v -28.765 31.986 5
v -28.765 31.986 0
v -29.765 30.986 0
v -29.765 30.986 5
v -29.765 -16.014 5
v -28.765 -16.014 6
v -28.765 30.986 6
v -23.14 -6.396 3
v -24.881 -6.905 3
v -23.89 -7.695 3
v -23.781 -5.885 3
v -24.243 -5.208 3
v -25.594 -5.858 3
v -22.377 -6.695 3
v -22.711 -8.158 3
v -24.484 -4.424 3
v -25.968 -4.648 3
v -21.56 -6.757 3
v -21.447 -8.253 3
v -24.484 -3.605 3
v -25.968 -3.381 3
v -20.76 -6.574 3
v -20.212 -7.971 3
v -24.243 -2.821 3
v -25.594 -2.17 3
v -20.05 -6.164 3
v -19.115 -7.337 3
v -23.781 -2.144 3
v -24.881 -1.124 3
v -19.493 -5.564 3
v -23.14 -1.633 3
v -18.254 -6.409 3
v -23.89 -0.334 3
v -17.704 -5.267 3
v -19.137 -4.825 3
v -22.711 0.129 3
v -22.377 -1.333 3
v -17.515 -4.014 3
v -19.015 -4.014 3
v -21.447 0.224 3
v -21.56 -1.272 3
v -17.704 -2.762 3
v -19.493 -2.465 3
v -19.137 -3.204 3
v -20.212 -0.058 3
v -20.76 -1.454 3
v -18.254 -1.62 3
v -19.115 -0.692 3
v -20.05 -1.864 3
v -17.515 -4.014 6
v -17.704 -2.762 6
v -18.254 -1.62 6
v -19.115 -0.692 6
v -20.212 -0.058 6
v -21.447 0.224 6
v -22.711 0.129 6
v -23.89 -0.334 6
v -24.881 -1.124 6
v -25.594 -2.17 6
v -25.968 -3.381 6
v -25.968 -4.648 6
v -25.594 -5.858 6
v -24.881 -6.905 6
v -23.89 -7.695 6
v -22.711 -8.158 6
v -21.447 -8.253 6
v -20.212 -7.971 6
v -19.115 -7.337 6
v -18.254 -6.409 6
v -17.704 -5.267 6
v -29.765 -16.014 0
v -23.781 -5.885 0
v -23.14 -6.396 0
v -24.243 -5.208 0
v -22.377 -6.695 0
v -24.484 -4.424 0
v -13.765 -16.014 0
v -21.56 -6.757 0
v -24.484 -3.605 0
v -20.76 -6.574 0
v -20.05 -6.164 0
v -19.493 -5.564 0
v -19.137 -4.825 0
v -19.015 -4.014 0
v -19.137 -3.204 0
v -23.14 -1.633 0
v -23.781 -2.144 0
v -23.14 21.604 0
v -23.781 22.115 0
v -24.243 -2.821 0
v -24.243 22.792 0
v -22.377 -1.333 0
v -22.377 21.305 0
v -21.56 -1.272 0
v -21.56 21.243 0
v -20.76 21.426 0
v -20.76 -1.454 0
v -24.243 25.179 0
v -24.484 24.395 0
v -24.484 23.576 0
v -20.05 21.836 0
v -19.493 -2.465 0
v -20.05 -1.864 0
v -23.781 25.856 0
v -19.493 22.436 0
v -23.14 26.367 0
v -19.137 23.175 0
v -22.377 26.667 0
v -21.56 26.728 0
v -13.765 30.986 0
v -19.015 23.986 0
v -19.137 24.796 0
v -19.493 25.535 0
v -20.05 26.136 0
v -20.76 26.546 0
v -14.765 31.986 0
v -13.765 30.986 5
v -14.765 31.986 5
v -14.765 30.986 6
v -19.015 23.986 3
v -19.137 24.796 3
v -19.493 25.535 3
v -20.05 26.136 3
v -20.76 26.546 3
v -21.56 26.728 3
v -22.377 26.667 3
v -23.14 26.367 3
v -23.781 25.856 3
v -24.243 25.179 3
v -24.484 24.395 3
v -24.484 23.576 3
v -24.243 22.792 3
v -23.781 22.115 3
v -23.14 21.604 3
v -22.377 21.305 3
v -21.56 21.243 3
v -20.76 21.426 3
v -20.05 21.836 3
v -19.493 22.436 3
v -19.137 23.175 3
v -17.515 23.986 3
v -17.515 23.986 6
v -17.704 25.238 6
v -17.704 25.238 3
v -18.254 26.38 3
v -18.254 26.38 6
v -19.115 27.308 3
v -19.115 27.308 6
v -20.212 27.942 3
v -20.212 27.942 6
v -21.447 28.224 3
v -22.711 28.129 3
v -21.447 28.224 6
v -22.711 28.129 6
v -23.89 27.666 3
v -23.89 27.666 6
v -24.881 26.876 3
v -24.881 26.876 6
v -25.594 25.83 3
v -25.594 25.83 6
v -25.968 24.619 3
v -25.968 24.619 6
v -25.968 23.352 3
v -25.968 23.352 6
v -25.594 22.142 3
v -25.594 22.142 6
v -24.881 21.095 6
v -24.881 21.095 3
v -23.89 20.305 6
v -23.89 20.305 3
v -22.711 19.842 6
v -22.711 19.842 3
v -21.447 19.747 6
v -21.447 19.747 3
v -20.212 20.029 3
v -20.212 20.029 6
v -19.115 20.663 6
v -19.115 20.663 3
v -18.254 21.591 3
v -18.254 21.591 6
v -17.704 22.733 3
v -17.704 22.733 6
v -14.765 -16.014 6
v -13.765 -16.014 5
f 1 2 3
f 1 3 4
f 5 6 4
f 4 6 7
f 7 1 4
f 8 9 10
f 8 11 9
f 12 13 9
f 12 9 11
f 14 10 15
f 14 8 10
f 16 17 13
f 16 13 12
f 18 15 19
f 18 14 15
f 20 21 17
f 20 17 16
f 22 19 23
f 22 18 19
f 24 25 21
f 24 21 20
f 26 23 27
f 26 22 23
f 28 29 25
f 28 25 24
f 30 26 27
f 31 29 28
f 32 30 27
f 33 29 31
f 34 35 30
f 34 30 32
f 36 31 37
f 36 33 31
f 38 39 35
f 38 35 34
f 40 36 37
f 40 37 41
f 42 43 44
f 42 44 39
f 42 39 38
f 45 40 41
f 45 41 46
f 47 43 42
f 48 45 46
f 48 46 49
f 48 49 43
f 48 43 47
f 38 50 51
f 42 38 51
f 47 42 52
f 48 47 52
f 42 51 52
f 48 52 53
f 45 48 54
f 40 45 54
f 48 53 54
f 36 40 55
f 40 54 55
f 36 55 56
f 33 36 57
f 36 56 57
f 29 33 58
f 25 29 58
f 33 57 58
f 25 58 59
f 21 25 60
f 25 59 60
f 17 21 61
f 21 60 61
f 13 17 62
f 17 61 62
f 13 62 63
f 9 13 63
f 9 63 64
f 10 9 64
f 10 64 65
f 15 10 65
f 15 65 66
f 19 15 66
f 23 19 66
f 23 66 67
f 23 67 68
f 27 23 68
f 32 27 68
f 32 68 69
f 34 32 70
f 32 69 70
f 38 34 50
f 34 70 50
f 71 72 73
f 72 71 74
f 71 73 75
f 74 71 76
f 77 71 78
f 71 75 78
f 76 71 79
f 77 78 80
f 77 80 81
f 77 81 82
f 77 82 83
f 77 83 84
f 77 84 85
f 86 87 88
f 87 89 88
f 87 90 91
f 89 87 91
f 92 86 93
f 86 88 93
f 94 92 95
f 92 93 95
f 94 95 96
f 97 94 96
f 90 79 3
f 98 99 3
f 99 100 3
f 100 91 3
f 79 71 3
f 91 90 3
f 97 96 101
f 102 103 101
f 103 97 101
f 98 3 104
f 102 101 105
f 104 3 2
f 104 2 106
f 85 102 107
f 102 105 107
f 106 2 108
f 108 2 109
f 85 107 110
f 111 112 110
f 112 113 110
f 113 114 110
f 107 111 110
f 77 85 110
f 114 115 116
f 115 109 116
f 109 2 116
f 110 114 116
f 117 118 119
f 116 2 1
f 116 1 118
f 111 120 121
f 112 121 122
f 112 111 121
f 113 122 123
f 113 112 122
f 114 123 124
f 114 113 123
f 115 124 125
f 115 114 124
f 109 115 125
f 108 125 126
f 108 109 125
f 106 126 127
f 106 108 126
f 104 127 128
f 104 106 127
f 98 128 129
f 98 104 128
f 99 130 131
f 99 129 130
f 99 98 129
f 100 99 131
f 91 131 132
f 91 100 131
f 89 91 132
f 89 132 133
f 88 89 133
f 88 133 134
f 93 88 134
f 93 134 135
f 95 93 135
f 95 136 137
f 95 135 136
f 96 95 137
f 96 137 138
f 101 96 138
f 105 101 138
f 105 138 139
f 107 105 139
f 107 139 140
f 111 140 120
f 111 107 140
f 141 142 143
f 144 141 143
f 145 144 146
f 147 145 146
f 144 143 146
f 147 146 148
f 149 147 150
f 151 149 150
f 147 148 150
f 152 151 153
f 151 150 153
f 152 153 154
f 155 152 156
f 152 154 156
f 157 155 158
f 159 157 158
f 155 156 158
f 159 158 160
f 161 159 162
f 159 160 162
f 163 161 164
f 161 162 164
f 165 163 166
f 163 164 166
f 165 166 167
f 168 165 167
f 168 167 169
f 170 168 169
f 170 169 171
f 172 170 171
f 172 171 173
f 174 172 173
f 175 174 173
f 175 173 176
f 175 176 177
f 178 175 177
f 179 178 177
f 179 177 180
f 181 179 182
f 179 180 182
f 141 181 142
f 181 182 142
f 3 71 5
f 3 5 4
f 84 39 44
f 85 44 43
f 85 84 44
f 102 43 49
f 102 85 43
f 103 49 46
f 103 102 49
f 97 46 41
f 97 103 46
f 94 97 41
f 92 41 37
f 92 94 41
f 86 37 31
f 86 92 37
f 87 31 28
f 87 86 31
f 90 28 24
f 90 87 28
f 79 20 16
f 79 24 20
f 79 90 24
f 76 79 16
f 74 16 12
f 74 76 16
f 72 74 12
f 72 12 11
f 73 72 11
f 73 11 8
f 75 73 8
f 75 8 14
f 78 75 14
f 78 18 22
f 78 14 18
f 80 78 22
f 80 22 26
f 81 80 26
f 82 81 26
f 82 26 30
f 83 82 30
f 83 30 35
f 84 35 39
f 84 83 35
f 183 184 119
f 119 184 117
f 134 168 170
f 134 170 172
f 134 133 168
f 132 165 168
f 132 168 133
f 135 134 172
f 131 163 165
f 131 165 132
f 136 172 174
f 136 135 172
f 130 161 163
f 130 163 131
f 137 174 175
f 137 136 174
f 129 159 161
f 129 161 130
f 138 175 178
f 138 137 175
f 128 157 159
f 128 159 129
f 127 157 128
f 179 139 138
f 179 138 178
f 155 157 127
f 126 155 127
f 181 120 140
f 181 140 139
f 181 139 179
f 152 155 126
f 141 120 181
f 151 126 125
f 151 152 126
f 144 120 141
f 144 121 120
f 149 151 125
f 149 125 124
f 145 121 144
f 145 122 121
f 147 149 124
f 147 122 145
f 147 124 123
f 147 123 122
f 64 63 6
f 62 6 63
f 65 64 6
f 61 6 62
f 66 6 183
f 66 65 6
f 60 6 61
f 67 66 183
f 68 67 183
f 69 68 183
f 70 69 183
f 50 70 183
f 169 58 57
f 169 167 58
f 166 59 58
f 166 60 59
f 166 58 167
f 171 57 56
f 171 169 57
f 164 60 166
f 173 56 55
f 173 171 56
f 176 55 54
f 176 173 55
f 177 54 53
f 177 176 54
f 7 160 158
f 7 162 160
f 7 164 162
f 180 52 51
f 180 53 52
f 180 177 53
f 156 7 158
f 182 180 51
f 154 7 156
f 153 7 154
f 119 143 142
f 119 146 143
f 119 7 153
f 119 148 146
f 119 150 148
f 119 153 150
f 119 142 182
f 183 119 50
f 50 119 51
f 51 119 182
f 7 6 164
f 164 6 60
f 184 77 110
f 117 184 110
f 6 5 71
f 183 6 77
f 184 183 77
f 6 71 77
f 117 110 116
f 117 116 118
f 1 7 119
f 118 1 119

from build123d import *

# Parameters (mm, degrees)
F0_W     = 16
F0_H     = 48
F0_R     = 2.75
F1_DEPTH = 6
F2_R     = 4.25
F3_DEPTH = 3
F4_SIZE  = 1


with BuildPart() as f1:
    # F0 (on Top) → F1 (new body)
    with BuildSketch(Plane.XY):
        with Locations((-21.765074, 7.98561)):
            Rectangle(F0_W, F0_H)
        with Locations((-21.765074, -4.01439)):
            Circle(F0_R, mode=Mode.SUBTRACT)
        with Locations((-21.765074, 23.98561)):
            Circle(F0_R, mode=Mode.SUBTRACT)
    extrude(amount=F1_DEPTH)

    # F2 (on face) → F3 (cut)
    with BuildSketch(Plane.XY.offset(6)):
        with Locations((-21.765074, 23.98561)):
            Circle(F2_R)
        with Locations((-21.765074, -4.01439)):
            Circle(F2_R)
    extrude(amount=-F3_DEPTH, mode=Mode.SUBTRACT)

    # F4
    f4_edges = [f1.edges().sort_by_distance(p)[0] for p in [
        (-29.765074, 31.98561, 3),
        (-21.765074, 31.98561, 6),
        (-13.765074, 31.98561, 3),
        (-29.765074, 7.98561, 6),
        (-13.765074, 7.98561, 6),
    ]]
    chamfer(f4_edges, length=F4_SIZE)


solid = f1.part
